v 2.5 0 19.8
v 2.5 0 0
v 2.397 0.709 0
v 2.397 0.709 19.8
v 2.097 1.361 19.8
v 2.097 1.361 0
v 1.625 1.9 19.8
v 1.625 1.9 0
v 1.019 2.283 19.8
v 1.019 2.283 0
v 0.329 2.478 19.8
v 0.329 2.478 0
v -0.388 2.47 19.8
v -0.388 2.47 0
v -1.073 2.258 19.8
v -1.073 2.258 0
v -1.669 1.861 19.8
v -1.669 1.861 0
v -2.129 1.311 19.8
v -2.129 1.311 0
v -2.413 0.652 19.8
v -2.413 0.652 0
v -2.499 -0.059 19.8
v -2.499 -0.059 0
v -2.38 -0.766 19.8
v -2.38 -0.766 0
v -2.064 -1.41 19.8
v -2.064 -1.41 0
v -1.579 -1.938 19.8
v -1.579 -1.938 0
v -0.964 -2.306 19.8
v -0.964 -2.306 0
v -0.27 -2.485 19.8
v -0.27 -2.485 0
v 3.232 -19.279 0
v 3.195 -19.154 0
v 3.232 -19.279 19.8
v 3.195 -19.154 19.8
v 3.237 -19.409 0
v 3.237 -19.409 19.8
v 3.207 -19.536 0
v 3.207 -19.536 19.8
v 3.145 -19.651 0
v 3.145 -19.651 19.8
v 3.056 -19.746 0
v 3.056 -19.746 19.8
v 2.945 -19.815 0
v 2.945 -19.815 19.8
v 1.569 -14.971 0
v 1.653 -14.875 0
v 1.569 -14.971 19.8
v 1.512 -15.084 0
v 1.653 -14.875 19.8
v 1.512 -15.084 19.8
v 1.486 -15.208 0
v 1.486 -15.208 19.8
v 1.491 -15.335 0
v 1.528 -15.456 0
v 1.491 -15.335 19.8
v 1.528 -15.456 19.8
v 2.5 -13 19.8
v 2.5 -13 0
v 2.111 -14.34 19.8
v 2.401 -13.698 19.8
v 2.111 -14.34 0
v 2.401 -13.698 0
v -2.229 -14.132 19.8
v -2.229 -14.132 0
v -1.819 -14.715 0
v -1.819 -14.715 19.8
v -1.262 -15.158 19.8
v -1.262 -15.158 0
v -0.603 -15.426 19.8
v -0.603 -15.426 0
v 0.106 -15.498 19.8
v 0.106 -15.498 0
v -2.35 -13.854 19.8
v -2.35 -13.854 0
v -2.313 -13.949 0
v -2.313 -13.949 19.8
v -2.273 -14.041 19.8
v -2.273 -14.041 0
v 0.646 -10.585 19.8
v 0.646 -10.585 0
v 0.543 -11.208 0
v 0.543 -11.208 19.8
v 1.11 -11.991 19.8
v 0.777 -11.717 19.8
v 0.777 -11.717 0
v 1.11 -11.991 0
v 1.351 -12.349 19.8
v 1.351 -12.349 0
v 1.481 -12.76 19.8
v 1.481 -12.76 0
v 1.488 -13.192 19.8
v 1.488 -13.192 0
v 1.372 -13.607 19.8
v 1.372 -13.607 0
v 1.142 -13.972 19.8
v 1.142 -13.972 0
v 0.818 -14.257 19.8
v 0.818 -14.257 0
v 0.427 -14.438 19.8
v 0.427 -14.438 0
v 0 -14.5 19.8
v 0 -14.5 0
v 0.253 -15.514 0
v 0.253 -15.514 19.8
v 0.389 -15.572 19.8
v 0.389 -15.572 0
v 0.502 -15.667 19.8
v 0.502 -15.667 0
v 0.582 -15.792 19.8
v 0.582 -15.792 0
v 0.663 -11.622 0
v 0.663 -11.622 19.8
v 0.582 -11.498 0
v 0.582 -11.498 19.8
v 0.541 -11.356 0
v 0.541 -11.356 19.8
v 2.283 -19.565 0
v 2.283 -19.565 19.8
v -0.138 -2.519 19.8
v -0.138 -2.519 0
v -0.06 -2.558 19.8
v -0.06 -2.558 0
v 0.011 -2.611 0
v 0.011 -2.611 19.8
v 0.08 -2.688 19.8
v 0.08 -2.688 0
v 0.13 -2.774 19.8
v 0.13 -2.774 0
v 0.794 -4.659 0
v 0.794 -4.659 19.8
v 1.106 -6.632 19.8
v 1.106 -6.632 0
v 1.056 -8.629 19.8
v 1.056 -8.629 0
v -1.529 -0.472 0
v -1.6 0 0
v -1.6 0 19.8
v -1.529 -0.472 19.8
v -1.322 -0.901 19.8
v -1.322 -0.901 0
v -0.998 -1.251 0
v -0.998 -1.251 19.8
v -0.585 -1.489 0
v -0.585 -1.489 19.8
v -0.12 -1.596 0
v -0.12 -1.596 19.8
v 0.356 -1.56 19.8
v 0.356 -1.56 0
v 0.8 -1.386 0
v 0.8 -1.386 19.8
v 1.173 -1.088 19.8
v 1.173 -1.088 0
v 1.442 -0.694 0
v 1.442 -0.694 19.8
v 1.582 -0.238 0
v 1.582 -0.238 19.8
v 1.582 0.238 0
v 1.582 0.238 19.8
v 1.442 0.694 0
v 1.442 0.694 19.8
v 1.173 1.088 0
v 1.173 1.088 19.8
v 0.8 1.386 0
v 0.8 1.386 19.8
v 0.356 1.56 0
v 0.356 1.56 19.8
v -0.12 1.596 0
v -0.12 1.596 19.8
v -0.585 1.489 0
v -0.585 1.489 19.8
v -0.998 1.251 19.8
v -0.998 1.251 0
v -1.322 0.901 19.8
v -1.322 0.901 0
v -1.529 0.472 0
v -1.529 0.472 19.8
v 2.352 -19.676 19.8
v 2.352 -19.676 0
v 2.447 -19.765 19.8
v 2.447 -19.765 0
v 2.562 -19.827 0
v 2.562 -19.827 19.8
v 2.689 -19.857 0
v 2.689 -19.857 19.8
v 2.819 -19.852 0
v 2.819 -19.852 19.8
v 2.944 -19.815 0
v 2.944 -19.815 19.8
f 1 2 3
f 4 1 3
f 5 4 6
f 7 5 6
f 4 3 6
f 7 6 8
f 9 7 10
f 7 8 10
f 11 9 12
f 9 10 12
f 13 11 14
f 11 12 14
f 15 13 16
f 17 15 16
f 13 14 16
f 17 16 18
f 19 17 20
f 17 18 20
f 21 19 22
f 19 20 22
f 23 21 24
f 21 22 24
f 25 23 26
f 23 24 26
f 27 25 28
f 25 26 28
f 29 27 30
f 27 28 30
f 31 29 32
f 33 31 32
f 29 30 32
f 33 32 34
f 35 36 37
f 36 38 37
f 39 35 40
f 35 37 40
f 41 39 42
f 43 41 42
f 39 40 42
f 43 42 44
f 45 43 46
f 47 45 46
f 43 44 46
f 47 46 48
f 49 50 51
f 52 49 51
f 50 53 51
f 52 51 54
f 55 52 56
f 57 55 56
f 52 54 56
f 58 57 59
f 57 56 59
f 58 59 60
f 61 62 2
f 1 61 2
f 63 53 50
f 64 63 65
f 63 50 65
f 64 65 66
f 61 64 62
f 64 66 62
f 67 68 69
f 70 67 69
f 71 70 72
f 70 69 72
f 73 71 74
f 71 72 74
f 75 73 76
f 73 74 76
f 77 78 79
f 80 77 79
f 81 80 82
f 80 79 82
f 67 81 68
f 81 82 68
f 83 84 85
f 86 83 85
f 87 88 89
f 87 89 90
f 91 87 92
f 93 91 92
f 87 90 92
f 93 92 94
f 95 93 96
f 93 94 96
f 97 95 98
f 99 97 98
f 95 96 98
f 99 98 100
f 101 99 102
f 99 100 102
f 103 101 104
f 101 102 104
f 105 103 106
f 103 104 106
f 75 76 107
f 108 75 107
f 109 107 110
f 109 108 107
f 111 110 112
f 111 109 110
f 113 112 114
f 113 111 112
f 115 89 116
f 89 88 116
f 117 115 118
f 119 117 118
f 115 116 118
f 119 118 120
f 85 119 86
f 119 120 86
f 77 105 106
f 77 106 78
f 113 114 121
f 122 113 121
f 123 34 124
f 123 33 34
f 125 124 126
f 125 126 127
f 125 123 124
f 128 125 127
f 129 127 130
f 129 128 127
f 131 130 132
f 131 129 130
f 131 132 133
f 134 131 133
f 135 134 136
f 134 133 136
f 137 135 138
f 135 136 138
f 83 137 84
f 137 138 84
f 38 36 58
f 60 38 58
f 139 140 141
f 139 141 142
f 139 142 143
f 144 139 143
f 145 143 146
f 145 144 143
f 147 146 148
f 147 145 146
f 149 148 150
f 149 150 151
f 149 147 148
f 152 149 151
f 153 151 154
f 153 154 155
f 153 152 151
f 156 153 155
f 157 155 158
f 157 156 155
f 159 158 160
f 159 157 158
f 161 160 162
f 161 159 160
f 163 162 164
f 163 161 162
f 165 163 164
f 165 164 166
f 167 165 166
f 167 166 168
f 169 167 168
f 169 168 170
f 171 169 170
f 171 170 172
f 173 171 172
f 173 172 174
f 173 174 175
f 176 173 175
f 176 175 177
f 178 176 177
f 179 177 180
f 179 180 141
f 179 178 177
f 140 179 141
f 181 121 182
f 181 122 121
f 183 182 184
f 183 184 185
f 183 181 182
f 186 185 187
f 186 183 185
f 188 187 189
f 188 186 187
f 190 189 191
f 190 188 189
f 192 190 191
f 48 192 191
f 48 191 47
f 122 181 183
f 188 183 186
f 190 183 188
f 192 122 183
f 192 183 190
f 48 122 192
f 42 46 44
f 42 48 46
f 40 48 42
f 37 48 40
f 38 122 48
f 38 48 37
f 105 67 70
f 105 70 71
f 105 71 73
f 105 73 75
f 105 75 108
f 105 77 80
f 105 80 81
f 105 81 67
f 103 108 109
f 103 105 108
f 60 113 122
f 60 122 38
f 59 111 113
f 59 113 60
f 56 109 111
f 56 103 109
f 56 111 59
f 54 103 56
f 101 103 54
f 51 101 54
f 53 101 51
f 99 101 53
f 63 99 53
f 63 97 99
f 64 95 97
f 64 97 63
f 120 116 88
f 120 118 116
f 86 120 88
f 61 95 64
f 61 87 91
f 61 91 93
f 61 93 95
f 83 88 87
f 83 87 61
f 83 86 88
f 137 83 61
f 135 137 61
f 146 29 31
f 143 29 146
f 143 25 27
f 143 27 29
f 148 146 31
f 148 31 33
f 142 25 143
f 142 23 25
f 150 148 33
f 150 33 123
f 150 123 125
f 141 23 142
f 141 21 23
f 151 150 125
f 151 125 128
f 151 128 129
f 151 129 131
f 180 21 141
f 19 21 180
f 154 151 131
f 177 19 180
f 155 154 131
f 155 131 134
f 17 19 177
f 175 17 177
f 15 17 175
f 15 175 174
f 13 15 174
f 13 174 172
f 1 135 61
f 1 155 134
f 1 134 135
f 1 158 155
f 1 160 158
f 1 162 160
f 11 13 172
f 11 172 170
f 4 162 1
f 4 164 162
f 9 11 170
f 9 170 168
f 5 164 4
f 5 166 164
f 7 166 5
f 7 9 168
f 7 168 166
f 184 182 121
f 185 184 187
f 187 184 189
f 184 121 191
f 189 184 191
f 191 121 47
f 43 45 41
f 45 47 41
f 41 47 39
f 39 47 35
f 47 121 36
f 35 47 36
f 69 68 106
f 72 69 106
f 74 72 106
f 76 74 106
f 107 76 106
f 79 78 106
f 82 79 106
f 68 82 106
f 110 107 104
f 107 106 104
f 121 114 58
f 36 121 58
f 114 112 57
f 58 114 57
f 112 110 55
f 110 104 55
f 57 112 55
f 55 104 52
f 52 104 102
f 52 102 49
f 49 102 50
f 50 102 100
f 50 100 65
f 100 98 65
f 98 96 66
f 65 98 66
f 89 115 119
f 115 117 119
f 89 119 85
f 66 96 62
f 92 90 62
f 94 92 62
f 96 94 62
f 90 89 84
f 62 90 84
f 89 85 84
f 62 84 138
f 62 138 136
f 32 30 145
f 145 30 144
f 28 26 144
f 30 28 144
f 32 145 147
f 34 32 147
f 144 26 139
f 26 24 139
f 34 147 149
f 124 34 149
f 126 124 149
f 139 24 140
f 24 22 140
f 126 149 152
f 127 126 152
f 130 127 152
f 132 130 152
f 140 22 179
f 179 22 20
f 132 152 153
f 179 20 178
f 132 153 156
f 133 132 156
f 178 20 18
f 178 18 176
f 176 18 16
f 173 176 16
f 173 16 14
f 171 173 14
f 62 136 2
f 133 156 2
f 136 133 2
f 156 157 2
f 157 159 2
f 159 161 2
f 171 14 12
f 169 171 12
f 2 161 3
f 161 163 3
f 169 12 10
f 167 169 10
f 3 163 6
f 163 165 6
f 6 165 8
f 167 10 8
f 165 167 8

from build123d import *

# Parameters (mm, degrees)
SKETCH1_R           = 2.5
SKETCH1_R_2         = 1.6
BOSS_EXTRUDE1_DEPTH = 19.8
FILLET1_R           = 0.5
BOSS_EXTRUDE2_START = -19.8
BOSS_EXTRUDE2_DEPTH = 19.8
FILLET2_R           = 0.5


with BuildPart() as part:
    # Sketch1 → Boss-Extrude1 (new body)
    # profile 1 of 5: a face of its own
    with BuildSketch(Plane.XY):
        Circle(SKETCH1_R)
        with Locations(Location((0, 0, 0), (0, 0, 180))):
            Circle(SKETCH1_R_2, mode=Mode.SUBTRACT)
    # profile 2 of 5: a face of its own
    with BuildSketch(Plane.XY):
        with BuildLine():
            Line((2.5, -13), (2.5, 0))
            ThreePointArc((2.5, 0), (1.767766953, -1.767766953), (0, -2.5))
            ThreePointArc((0, -2.5), (1.095258289, -6.480732801), (0.645816542, -10.584855906))
            ThreePointArc((0.645816542, -10.584855906), (1.98299538, -11.477590948), (2.5, -13))
        make_face()
    # profile 3 of 5: a face of its own
    with BuildSketch(Plane.XY):
        with BuildLine():
            ThreePointArc((-2.228856339, -14.132342448), (0.582176585, -15.431269303), (2.5, -13))
            ThreePointArc((2.5, -13), (1.98299538, -11.477590948), (0.645816542, -10.584855906))
            Line((0.645816542, -10.584855906), (0.481752062, -11.579466667))
            ThreePointArc((0.481752062, -11.579466667), (1.48, -13.244131112), (0, -14.5))
            ThreePointArc((0, -14.5), (-0.244131112, -14.48), (-0.481752062, -14.420533333))
            Line((-0.481752062, -14.420533333), (-2.228856339, -14.132342448))
        make_face()
    # profile 4 of 5: a face of its own
    with BuildSketch(Plane.XY):
        with BuildLine():
            Line((0, -14.5), (-0.481752062, -14.420533333))
            ThreePointArc((-0.481752062, -14.420533333), (-0.244131112, -14.48), (0, -14.5))
        make_face()
    # profile 5 of 5: a face of its own
    with BuildSketch(Plane.XY):
        with BuildLine():
            ThreePointArc((-2.34950307, -13.854304), (-2.293397058, -13.995153222), (-2.228856339, -14.132342448))
            Line((-2.228856339, -14.132342448), (-0.481752062, -14.420533333))
            Line((-0.481752062, -14.420533333), (0, -14.5))
            Line((0, -14.5), (-2.34950307, -13.854304))
        make_face()
    extrude(amount=BOSS_EXTRUDE1_DEPTH)

    # Fillet1
    fillet1_edges = [part.edges().sort_by_distance(p)[0] for p in [
        (0.481752062, -11.579466667, 9.9),
        (0, -2.5, 9.9),
    ]]
    fillet(fillet1_edges, radius=FILLET1_R)

    # Sketch2 → Boss-Extrude2 (add)
    with BuildSketch(Plane.XY.offset(19.8).offset(BOSS_EXTRUDE2_START)):
        with BuildLine():
            Line((3.400304681, -19.609307967), (1.36493731, -15.094503793))
            ThreePointArc((1.36493731, -15.094503793), (0.917921591, -15.325385979), (0.433729366, -15.462088308))
            Line((0.433729366, -15.462088308), (2.488663388, -20.020294772))
            Line((2.488663388, -20.020294772), (3.400304681, -19.609307967))
        make_face()
    extrude(amount=BOSS_EXTRUDE2_DEPTH)

    # Fillet2
    fillet2_edges = [part.edges().sort_by_distance(p)[0] for p in [
        (0.433729366, -15.462088308, 9.9),
        (1.36493731, -15.094503793, 9.9),
        (3.400304681, -19.609307967, 9.9),
        (2.488663388, -20.020294772, 9.9),
    ]]
    fillet(fillet2_edges, radius=FILLET2_R - 0.0001)  # a hair under: the kernel refuses the full size


solid = part.part
